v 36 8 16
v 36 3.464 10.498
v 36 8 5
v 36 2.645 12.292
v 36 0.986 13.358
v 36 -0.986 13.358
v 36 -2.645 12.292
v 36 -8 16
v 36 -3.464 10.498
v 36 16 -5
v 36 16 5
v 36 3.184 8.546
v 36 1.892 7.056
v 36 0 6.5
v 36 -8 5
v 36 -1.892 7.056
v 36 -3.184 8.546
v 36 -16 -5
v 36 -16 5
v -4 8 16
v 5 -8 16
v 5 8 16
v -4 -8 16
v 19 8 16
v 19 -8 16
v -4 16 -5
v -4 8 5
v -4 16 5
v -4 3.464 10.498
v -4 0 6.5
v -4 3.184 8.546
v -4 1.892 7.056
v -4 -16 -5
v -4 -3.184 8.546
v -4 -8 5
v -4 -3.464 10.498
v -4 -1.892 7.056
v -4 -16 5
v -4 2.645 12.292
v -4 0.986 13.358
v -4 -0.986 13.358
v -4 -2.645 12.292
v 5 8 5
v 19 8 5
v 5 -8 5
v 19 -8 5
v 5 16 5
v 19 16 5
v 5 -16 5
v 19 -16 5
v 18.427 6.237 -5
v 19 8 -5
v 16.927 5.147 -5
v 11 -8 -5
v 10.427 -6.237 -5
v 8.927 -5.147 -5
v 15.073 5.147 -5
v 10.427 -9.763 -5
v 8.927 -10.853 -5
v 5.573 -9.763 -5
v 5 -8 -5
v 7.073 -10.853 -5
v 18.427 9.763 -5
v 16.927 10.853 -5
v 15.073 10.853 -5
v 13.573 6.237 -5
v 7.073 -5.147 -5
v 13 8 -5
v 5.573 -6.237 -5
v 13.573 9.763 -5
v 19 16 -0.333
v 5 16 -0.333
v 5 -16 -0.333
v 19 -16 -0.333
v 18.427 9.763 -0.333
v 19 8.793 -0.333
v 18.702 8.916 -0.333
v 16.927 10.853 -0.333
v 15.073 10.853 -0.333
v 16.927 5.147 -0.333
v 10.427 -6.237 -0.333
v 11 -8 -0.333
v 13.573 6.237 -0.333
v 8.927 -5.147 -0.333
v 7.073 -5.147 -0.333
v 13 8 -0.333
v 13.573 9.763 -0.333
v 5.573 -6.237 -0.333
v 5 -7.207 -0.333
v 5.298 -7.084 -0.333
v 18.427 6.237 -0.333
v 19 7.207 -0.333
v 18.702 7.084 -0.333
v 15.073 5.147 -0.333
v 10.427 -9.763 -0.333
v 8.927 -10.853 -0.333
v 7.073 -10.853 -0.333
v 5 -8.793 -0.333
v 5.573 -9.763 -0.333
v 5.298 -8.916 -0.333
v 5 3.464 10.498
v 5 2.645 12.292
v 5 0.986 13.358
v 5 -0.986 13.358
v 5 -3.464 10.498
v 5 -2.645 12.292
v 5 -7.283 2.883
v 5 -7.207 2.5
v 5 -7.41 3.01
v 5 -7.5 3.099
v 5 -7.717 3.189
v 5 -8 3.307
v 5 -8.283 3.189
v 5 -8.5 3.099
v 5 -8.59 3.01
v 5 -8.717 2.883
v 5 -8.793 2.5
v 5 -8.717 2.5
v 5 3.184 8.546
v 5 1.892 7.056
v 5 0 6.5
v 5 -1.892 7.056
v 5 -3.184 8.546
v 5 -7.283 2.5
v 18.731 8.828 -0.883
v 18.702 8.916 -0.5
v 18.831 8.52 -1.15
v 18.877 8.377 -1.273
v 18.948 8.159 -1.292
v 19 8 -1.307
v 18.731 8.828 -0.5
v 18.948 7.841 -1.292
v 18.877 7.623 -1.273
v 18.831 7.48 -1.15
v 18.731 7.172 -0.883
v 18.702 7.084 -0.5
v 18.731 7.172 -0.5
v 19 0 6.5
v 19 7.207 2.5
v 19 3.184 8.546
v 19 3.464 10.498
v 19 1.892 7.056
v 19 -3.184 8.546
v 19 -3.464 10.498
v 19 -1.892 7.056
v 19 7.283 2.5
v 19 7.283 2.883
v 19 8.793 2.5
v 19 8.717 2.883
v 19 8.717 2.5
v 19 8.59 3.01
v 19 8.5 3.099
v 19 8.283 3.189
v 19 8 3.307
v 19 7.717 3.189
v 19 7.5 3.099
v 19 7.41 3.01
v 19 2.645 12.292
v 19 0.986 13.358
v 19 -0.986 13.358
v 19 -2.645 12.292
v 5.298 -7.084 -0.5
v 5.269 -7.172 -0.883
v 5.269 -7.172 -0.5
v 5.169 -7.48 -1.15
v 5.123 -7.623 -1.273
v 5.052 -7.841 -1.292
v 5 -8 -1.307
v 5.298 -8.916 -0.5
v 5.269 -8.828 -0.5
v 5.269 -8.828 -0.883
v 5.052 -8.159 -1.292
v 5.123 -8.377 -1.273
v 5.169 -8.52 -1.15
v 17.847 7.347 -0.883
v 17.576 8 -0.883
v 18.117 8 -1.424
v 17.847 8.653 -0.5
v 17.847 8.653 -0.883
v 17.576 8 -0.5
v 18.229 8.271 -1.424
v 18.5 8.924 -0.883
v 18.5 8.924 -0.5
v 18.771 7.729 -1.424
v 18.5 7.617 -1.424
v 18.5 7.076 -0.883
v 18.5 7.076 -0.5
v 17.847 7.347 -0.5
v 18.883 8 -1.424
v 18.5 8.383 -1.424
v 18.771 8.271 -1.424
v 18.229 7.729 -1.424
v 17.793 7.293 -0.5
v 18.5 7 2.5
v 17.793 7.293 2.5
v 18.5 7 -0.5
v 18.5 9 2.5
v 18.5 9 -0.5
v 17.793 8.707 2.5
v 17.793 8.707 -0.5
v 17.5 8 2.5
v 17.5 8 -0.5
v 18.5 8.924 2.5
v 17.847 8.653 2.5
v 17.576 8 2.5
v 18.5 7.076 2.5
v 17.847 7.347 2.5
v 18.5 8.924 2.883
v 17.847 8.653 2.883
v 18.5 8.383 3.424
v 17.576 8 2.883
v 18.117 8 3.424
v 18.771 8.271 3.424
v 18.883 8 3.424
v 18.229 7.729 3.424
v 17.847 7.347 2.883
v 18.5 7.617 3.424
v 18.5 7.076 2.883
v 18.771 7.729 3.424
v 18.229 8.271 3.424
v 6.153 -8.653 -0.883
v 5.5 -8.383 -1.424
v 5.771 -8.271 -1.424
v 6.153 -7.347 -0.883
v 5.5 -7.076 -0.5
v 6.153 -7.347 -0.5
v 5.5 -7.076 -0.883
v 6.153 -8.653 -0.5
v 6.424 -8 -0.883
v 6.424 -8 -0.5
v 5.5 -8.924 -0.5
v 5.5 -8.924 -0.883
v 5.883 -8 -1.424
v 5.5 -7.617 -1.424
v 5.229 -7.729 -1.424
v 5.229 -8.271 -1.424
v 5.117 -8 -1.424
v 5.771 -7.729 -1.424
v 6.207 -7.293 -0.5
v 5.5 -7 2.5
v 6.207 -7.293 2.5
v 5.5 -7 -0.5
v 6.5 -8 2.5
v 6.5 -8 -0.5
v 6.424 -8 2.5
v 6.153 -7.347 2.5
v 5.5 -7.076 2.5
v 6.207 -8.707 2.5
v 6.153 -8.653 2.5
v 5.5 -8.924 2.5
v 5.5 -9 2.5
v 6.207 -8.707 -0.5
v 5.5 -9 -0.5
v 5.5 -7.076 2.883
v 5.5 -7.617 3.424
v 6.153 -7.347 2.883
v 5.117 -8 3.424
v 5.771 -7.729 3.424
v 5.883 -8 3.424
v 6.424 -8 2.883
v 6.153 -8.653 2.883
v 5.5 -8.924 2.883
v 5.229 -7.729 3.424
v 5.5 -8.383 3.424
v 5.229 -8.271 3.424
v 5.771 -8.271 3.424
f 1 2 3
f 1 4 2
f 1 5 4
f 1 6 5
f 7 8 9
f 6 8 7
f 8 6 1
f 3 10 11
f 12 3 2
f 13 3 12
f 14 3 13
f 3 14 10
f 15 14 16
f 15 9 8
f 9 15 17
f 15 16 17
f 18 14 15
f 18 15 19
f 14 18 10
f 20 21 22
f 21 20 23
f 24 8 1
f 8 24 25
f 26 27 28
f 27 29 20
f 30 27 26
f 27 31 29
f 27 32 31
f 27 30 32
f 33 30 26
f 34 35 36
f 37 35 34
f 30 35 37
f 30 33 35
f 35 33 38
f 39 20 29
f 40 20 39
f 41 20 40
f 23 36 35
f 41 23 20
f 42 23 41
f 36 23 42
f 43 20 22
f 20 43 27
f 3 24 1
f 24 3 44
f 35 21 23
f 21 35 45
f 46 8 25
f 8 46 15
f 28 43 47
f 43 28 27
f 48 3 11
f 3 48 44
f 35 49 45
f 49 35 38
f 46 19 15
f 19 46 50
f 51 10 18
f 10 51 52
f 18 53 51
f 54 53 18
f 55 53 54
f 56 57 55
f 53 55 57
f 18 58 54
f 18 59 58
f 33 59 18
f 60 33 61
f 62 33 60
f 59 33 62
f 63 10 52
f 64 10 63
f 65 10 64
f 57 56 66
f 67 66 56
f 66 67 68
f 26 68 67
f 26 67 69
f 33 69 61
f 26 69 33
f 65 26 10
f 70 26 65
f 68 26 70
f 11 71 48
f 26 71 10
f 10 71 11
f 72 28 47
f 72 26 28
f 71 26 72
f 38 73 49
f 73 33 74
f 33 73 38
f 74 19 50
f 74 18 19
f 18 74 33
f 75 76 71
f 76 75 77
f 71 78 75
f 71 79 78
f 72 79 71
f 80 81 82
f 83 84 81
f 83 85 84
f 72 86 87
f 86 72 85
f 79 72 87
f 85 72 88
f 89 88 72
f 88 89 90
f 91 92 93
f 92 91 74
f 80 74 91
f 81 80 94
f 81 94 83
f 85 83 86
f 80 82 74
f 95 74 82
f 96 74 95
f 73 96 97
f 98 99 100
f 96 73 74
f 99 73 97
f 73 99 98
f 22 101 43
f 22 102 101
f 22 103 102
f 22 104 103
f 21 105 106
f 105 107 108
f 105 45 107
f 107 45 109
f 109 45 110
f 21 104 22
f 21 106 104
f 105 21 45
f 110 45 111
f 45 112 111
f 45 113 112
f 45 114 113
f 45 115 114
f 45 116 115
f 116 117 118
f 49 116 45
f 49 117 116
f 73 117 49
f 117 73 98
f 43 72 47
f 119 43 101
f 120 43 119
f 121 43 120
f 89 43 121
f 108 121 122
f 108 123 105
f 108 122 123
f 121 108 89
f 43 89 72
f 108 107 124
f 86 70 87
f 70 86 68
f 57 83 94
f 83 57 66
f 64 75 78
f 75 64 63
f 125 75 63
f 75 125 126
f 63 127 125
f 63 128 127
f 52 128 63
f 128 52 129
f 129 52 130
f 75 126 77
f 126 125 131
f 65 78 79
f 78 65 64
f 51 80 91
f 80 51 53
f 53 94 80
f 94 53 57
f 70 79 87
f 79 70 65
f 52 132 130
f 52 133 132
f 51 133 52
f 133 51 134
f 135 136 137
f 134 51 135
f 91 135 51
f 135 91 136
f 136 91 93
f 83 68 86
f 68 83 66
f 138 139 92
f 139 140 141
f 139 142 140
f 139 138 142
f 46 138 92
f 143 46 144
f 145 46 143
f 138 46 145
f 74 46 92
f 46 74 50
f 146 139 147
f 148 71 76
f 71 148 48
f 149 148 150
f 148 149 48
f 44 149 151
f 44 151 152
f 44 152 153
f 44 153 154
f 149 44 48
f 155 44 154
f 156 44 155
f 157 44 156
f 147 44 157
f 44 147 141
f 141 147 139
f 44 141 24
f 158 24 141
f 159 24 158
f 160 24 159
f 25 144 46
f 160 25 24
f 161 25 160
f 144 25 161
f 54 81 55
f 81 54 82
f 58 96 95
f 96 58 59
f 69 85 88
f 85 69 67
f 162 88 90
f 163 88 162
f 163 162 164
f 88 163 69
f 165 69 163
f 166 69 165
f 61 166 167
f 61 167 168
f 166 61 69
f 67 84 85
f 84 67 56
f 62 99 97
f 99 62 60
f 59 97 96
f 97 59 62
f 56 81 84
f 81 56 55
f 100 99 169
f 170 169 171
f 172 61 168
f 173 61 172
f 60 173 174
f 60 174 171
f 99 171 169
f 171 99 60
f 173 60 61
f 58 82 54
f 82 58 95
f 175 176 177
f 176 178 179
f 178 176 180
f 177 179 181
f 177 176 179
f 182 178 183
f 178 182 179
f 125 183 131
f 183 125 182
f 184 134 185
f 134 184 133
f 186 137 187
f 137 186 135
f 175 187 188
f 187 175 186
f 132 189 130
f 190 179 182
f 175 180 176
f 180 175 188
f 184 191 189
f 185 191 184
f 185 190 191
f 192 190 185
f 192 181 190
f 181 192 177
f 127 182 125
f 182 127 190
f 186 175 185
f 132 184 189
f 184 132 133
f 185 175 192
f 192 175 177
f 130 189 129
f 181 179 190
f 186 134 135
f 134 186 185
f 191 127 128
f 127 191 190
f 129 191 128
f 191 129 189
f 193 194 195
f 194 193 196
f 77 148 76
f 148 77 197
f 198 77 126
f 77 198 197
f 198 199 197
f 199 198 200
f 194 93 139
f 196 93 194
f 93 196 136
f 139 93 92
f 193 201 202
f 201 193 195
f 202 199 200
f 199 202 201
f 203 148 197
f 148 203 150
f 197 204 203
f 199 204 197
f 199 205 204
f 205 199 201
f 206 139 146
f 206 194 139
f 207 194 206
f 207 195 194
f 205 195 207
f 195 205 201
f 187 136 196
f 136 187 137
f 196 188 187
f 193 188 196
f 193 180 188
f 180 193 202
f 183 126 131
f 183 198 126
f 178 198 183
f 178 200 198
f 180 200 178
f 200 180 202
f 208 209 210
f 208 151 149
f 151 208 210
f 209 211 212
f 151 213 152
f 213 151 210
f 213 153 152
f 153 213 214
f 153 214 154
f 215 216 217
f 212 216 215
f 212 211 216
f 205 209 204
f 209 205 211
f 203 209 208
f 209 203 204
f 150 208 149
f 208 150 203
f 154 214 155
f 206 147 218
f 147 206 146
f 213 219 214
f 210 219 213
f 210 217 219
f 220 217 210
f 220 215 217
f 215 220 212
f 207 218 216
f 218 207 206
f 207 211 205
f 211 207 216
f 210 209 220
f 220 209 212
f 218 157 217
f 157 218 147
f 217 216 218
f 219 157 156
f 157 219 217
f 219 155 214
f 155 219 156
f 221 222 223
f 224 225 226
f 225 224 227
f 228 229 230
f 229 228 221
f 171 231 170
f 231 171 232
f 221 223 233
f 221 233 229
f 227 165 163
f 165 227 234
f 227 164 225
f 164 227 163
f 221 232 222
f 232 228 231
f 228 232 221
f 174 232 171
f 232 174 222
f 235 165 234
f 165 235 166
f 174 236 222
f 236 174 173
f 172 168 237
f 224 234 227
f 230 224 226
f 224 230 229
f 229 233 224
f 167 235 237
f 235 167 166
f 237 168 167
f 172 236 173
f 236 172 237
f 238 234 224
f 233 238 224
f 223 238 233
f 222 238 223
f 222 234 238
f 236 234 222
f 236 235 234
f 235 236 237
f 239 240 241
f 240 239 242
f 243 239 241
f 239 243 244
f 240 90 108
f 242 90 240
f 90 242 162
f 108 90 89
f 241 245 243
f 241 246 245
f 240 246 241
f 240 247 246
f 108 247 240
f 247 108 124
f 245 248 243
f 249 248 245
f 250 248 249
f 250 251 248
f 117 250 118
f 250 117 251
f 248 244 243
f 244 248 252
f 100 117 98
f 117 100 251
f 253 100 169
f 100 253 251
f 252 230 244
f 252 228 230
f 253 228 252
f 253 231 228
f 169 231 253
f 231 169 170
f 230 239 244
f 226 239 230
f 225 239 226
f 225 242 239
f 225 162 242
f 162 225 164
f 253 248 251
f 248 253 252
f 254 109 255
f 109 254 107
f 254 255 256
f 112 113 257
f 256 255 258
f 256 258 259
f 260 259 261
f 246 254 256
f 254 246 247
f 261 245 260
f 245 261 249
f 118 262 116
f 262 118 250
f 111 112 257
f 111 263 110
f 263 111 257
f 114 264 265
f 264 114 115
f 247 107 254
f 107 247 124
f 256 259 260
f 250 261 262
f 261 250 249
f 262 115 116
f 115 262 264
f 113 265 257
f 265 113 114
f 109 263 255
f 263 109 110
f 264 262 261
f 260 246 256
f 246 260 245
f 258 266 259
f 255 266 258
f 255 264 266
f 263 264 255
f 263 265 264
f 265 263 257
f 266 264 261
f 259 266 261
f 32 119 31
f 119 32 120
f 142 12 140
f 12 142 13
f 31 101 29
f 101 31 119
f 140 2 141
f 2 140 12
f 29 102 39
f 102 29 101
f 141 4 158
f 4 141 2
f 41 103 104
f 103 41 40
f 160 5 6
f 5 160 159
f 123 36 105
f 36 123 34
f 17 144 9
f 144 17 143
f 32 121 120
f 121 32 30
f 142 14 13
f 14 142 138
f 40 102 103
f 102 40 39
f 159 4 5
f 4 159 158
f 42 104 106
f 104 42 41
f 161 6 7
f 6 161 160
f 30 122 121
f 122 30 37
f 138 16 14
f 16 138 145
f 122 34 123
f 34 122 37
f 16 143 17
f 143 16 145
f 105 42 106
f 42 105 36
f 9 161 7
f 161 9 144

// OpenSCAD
module blocka(len,wid,ht,slot,n) {
      translate([-4,-8,4]) cube([40,wid/2,12]);
      translate([len/5,0,0])
		   cube([len/2,wid,ht],center=true);
}

module blockr(len, wid, ht, slot, n) {
   tuber = 3;
   yoff = 8;
	difference() {
      blocka(len,wid,ht,slot,n);    
		section(slot,wid,ht,tuber,n,yoff);
      translate([3*slot,0,0])
        mirror([1,0,0])
		    section(slot,wid,ht,tuber,n,-yoff);
   }
translate([0,0,2])
   pip(slot,wid,ht,3,n, 0.5+slot/2, yoff);
translate([0,0,2])
   pip(slot,wid,ht,3,n, -(slot/2+3*tuber/2), -yoff);
			
}

module section(slot,wid,ht,tuber, n,yoff) {
		translate([2*n*slot-(7*slot)/8,yoff,4+2*ht/3])
			cube([slot,4*wid,2+2*ht], center=true);
   	translate([2*n*slot,yoff,ht/3])
         cylinder(r=tuber,h=3*ht,center=true);
}

module pip(slot,wid,ht,tuber,n, xoff, yoff) {
       translate([xoff+2*n*slot-tuber/2-0.5,yoff,-2.5])
         sphere(tuber/3,center=true,$fn=8);
   	translate([xoff+2*n*slot-tuber/2-0.5,yoff,-1])
         cylinder(r=tuber/3,h=1+ht/5,center=true,$fn=8);
       translate([xoff+2*n*slot-tuber/2-0.5,yoff,0.5])
         sphere(tuber/3,center=true,$fn=8);
}
difference() {
   blockr(80,32,10,8,1 );
   translate([20,0,10])
        rotate([0,90,0]) cylinder(r=3.5,h=70,center=true);
}
